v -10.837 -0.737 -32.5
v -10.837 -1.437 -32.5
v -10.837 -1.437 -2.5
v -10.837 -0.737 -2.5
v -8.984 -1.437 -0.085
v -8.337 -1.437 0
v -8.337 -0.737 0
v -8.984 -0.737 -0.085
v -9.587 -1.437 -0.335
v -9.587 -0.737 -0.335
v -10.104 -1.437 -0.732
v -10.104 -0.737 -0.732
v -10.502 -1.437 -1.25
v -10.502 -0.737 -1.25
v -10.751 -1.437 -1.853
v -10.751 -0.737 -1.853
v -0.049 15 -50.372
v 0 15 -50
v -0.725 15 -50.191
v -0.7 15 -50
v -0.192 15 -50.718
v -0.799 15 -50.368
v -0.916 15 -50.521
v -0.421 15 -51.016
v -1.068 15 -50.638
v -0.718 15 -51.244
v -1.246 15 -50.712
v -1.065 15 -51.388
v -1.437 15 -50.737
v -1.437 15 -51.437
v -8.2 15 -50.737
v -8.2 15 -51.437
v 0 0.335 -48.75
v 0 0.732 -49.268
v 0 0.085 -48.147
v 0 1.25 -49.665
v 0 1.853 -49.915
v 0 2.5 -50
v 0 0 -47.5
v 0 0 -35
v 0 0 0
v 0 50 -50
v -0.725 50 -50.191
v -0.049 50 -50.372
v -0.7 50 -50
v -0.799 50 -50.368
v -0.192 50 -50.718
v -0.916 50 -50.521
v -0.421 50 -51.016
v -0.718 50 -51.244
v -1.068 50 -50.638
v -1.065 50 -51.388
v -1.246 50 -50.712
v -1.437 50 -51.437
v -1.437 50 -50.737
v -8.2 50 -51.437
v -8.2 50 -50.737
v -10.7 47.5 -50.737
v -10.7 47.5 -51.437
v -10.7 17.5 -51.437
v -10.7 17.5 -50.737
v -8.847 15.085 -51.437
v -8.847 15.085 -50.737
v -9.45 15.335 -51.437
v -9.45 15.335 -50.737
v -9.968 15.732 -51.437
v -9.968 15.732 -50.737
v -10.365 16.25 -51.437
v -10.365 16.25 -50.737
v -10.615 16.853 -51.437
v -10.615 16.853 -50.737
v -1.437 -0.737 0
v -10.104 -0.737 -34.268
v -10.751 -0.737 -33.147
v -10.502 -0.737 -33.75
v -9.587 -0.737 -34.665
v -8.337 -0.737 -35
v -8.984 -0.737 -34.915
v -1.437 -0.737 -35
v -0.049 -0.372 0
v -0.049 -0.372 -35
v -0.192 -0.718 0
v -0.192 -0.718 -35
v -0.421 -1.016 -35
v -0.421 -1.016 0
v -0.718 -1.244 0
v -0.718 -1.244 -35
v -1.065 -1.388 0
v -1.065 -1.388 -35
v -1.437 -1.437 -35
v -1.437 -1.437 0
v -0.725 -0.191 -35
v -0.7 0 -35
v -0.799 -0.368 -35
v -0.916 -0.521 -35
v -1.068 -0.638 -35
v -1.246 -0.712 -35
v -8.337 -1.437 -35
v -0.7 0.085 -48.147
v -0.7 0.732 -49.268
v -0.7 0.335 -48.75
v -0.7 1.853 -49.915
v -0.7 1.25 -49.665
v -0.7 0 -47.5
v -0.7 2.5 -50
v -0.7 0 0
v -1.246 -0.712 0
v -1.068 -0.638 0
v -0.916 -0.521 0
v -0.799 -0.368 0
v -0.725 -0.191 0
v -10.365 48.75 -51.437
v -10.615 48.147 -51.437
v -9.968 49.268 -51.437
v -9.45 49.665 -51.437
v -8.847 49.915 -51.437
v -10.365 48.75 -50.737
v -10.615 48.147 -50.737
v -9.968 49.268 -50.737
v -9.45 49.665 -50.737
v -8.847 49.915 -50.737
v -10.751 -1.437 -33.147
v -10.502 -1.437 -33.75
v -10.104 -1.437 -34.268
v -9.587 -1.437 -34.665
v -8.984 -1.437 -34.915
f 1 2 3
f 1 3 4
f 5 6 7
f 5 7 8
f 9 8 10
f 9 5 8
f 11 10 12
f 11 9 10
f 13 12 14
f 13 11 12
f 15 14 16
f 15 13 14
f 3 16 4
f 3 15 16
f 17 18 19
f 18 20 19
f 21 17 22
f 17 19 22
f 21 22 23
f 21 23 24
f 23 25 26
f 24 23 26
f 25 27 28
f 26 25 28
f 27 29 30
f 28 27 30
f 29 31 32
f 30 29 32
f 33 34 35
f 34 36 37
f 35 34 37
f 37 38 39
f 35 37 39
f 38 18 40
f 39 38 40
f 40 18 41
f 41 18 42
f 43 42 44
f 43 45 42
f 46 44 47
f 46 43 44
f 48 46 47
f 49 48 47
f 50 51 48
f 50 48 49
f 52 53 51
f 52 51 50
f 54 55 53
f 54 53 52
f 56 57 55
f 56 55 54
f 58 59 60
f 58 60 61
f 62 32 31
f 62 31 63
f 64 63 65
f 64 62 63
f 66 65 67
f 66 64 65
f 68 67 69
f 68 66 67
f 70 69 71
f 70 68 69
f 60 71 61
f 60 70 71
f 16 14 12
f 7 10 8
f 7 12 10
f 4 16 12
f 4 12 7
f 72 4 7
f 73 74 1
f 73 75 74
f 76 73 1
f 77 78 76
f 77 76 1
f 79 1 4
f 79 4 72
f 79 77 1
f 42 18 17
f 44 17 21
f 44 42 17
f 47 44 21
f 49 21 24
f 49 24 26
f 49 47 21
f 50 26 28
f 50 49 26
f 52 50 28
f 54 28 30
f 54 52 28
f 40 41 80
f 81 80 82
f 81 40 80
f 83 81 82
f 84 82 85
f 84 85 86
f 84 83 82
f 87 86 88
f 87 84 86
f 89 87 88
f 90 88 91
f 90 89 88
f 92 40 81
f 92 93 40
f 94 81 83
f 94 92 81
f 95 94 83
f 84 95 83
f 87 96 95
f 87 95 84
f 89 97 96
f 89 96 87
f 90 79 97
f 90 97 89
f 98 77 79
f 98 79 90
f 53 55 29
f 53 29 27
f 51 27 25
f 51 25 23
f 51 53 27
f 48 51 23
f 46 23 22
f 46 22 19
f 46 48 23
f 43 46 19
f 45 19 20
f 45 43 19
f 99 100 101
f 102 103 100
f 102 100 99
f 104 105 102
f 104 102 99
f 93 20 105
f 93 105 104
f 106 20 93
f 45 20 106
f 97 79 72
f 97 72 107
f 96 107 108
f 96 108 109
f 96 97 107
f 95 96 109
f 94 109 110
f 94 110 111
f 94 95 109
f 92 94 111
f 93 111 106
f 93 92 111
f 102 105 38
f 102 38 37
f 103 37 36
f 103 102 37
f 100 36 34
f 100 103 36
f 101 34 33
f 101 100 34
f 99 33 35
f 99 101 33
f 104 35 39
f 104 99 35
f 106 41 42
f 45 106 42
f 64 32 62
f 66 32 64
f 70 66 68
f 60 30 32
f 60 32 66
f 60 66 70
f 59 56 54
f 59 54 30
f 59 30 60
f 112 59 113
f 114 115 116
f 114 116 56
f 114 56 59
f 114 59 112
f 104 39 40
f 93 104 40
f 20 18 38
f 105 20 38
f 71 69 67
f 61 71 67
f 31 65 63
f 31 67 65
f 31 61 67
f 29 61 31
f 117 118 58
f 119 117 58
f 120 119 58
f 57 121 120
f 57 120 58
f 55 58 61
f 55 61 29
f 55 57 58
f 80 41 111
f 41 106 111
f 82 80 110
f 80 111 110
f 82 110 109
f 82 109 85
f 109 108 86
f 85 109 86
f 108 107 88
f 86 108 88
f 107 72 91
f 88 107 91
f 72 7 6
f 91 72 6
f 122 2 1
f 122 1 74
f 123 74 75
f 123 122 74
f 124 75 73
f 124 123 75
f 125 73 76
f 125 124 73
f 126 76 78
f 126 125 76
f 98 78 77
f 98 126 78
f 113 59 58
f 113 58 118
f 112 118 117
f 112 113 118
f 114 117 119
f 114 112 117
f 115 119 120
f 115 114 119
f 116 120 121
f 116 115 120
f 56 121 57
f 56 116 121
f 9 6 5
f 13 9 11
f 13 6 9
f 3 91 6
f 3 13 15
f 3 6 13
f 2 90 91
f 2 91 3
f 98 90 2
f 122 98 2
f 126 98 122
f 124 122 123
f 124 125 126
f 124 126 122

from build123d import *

# Parameters (mm, degrees)
BASE_FLANGE1_DEPTH    = 0.7
EDGE_FLANGE1_DEPTH    = 35
EDGE_FLANGE2_DEPTH    = 35
BREAK_CORNER1_START   = -1.4366
BREAK_CORNER1_DEPTH   = 0.7
BREAK_CORNER1_START_2 = -0.7
BREAK_CORNER1_2_DEPTH = 0.7
BREAK_CORNER1_START_3 = -51.4366
BREAK_CORNER1_3_DEPTH = 0.7


# Read off the part's stored shape, not the designer's step: Break-Corner1
# Sheet-metal steps are written as plain solids
with BuildPart() as part:
    # Sketch1 → Base-Flange1 (new body)
    with BuildSketch(Plane(origin=(0, 0, 0), x_dir=(0, 0, -1), z_dir=(1, 0, 0))):
        Polygon((0, 0), (50, 50), (50, 0), align=None)
    extrude(amount=-BASE_FLANGE1_DEPTH)

    # Edge-Flange1 section (across the edge) → Edge-Flange1 (add)
    with BuildSketch(Plane(origin=(-0.7, 50, -50.7366), x_dir=(0, 0, 1), z_dir=(0, -1, 0))):
        with BuildLine():
            Line((-0.7, 0.7366), (-0.7, 10))
            Line((-0.7, 10), (0, 10))
            Line((0, 10), (0, 0.7366))
            ThreePointArc((0, 0.7366), (0.215745145, 0.215745145), (0.7366, 0))
            Line((0.7366, 0), (0.7366, -0.7))
            ThreePointArc((0.7366, -0.7), (-0.279229602, -0.279229602), (-0.7, 0.7366))
        make_face()
    extrude(amount=EDGE_FLANGE1_DEPTH)

    # Edge-Flange2 section (across the edge) → Edge-Flange2 (add)
    with BuildSketch(Plane(origin=(-0.7, -0.7366, -35), x_dir=(0, 1, 0), z_dir=(0, 0, 1))):
        with BuildLine():
            Line((-0.7, 0.7366), (-0.7, 10.1366))
            Line((-0.7, 10.1366), (0, 10.1366))
            Line((0, 10.1366), (0, 0.7366))
            ThreePointArc((0, 0.7366), (0.215745145, 0.215745145), (0.7366, 0))
            Line((0.7366, 0), (0.7366, -0.7))
            ThreePointArc((0.7366, -0.7), (-0.279229602, -0.279229602), (-0.7, 0.7366))
        make_face()
    extrude(amount=EDGE_FLANGE2_DEPTH)

    # Break-Corner1 outline → Break-Corner1 (cut)
    with BuildSketch(Plane(origin=(0, 0, 0), x_dir=(1, 0, 0), z_dir=(0, 1, 0)).offset(BREAK_CORNER1_START)):
        with BuildLine():
            ThreePointArc((-8.3366, 0), (-10.104366953, 0.732233047), (-10.8366, 2.5))
            Line((-10.8366, 2.5), (-10.8366, 0))
            Line((-10.8366, 0), (-8.3366, 0))
        make_face()
        with BuildLine():
            ThreePointArc((-10.8366, 32.5), (-10.104366953, 34.267766953), (-8.3366, 35))
            Line((-8.3366, 35), (-10.8366, 35))
            Line((-10.8366, 35), (-10.8366, 32.5))
        make_face()
    extrude(amount=BREAK_CORNER1_DEPTH, mode=Mode.SUBTRACT)

    # Break-Corner1 2 outline → Break-Corner1 2 (cut)
    with BuildSketch(Plane.YZ.offset(BREAK_CORNER1_START_2)):
        with BuildLine():
            ThreePointArc((2.5, -50), (0.732233047, -49.267766953), (0, -47.5))
            Line((0, -47.5), (0, -50))
            Line((0, -50), (2.5, -50))
        make_face()
    extrude(amount=BREAK_CORNER1_2_DEPTH, mode=Mode.SUBTRACT)

    # Break-Corner1 3 outline → Break-Corner1 3 (cut)
    with BuildSketch(Plane.XY.offset(BREAK_CORNER1_START_3)):
        with BuildLine():
            Line((-10.7, 50), (-10.7, 47.5))
            ThreePointArc((-10.7, 47.5), (-9.967766953, 49.267766953), (-8.2, 50))
            Line((-8.2, 50), (-10.7, 50))
        make_face()
        with BuildLine():
            ThreePointArc((-8.2, 15), (-9.967766953, 15.732233047), (-10.7, 17.5))
            Line((-10.7, 17.5), (-10.7, 15))
            Line((-10.7, 15), (-8.2, 15))
        make_face()
    extrude(amount=BREAK_CORNER1_3_DEPTH, mode=Mode.SUBTRACT)


solid = part.part
